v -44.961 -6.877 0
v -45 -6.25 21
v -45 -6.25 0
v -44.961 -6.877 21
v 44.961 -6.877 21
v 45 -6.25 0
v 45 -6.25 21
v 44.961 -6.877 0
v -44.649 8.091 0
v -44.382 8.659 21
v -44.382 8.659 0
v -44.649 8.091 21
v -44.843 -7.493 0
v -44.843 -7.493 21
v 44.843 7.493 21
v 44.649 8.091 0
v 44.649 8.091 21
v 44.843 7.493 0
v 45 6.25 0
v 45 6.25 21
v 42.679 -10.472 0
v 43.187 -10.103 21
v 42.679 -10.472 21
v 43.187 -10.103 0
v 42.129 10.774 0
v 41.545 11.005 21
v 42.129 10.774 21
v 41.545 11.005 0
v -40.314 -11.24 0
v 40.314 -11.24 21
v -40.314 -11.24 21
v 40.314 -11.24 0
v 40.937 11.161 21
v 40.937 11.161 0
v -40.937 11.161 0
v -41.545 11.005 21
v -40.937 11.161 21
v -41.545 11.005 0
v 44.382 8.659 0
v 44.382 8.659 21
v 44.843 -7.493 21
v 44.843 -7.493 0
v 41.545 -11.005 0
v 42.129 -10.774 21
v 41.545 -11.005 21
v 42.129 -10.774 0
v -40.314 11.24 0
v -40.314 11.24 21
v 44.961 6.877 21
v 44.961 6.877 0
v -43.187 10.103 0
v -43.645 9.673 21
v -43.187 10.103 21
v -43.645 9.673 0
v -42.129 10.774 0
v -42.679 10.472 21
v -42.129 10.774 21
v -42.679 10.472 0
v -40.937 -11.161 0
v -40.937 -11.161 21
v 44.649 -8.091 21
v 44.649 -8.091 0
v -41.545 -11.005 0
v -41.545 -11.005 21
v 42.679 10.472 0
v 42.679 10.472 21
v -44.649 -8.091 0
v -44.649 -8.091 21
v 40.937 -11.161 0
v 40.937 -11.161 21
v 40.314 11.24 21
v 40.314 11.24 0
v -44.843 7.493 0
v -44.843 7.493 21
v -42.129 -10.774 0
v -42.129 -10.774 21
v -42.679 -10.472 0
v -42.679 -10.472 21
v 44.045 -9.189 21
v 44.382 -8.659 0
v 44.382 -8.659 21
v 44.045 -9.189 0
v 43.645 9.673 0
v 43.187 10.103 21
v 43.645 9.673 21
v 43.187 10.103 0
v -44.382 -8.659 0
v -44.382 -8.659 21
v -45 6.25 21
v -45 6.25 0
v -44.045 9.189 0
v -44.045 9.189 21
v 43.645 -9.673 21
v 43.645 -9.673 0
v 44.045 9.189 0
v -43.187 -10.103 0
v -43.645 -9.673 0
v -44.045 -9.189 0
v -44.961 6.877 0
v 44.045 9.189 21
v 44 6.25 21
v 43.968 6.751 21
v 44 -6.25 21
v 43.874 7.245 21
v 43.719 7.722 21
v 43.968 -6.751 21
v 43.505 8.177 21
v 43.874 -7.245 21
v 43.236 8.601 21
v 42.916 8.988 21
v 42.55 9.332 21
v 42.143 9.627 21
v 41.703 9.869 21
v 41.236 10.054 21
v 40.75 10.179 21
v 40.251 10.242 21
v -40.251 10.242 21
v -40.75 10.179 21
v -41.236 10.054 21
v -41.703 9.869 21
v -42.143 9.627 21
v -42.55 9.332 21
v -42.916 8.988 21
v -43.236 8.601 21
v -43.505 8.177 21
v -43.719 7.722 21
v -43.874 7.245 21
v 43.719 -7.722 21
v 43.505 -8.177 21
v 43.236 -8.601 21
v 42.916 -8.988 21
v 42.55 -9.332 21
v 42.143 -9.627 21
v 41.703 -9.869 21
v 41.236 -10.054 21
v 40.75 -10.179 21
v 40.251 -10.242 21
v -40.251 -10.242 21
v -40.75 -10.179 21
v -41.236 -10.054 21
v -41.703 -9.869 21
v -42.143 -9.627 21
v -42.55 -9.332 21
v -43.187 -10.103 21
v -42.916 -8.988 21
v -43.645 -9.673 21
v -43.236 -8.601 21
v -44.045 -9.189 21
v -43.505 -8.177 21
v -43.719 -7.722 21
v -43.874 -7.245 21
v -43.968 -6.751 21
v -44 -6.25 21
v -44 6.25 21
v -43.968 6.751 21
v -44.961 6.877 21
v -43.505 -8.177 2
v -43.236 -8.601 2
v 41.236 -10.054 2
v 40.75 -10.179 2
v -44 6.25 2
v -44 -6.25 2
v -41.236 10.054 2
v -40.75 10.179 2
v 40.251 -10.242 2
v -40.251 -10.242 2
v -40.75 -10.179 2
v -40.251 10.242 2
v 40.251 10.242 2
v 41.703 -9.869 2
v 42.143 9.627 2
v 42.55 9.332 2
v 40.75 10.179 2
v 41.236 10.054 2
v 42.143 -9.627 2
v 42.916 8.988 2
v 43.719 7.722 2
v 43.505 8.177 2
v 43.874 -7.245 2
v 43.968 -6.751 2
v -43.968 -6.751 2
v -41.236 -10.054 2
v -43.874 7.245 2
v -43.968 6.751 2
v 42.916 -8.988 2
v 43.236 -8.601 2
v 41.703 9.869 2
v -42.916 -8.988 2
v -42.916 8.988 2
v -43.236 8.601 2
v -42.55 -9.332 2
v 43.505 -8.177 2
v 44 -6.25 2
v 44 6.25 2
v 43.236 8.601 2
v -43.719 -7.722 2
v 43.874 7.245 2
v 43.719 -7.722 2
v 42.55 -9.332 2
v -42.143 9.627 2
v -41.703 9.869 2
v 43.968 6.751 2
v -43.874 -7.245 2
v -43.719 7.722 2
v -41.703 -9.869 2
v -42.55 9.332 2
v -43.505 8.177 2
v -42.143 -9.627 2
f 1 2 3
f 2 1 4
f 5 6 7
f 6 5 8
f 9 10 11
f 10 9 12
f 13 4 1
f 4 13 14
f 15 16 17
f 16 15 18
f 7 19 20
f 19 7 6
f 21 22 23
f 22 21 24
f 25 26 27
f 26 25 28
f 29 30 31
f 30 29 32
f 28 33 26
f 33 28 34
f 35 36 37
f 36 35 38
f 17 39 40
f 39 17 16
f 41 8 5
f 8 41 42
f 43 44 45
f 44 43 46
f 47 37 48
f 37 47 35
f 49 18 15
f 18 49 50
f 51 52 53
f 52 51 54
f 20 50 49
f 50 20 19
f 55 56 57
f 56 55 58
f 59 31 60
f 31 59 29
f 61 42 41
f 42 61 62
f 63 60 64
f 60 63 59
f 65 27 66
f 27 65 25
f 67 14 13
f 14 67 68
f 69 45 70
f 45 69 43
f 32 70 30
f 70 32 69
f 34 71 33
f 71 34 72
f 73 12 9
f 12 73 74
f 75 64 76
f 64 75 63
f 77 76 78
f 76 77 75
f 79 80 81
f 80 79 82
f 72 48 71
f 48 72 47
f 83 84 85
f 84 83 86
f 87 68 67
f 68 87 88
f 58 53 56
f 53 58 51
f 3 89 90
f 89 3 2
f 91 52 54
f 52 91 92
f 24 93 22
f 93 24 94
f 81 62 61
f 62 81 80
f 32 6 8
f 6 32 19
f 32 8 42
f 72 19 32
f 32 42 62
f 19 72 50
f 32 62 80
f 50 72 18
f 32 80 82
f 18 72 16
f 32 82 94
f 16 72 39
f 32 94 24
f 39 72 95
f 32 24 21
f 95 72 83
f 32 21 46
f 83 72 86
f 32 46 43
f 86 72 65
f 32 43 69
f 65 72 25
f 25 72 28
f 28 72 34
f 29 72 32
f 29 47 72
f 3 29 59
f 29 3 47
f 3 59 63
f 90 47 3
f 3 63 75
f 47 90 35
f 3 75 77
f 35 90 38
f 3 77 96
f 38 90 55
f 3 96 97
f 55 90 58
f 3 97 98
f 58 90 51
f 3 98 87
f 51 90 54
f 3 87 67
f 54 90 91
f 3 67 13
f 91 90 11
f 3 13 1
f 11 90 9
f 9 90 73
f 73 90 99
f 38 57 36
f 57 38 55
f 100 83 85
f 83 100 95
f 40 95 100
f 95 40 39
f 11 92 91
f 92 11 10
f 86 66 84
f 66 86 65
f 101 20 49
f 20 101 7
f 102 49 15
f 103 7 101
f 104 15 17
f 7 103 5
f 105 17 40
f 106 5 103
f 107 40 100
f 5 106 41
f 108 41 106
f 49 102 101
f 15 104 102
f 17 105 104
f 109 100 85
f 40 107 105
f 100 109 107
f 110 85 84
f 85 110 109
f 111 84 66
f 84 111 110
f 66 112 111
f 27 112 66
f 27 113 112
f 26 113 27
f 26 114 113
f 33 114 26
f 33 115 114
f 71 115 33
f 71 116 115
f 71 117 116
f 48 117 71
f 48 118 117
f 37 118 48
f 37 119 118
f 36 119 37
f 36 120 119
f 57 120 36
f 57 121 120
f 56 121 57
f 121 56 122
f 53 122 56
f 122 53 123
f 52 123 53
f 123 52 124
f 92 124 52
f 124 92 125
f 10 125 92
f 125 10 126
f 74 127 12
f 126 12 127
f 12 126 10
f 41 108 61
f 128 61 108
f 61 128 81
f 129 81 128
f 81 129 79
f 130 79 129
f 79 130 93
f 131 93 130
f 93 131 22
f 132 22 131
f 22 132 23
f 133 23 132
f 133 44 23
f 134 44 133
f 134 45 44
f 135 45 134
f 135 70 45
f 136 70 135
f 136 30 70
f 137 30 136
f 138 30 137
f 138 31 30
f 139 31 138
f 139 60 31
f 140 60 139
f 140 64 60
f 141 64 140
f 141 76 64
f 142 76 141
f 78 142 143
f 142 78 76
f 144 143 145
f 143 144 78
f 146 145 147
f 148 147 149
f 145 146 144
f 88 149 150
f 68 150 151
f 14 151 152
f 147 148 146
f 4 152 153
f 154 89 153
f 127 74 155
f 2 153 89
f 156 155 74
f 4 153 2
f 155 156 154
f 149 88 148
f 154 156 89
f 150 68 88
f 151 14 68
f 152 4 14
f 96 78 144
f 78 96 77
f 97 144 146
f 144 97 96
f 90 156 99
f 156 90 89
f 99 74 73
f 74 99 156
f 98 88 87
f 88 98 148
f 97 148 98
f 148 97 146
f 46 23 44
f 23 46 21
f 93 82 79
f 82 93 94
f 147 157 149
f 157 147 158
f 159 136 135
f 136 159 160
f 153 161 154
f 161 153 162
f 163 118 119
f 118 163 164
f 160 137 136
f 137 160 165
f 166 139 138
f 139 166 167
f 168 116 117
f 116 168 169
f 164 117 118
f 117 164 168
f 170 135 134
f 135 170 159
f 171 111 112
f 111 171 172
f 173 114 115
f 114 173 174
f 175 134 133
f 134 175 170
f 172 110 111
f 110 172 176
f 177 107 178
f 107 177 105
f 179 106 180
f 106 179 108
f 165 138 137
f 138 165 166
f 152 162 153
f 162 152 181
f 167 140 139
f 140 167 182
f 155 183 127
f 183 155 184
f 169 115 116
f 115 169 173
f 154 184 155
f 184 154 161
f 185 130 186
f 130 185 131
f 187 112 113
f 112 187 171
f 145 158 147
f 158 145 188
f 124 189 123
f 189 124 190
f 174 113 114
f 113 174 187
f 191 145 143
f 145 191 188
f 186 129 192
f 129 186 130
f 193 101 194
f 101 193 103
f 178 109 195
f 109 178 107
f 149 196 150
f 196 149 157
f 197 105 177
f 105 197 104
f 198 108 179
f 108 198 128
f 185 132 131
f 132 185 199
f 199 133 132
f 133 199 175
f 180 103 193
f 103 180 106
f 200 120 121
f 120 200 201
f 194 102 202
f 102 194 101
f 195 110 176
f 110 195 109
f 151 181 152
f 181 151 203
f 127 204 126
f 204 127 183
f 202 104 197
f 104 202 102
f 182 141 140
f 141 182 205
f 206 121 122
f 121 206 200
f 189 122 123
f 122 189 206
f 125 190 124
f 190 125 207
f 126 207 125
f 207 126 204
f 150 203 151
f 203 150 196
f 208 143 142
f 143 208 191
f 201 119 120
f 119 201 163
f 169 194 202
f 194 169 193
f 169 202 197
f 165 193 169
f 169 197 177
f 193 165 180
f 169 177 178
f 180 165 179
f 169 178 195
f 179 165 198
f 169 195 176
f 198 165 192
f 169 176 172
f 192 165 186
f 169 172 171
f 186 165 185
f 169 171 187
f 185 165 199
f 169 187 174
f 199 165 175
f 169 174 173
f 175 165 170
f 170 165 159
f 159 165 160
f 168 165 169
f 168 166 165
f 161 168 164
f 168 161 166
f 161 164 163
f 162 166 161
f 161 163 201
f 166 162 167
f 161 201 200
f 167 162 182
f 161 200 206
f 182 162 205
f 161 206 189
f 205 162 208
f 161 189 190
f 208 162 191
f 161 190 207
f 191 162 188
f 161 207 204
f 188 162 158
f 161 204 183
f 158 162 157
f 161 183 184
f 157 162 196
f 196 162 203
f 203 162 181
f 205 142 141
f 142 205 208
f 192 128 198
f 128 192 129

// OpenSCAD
$fn = 50;


difference() {
	union() {
		hull() {
			translate(v = [-40.0000000000, 6.2500000000, 0]) {
				cylinder(h = 21, r = 5);
			}
			translate(v = [40.0000000000, 6.2500000000, 0]) {
				cylinder(h = 21, r = 5);
			}
			translate(v = [-40.0000000000, -6.2500000000, 0]) {
				cylinder(h = 21, r = 5);
			}
			translate(v = [40.0000000000, -6.2500000000, 0]) {
				cylinder(h = 21, r = 5);
			}
		}
	}
	union() {
		translate(v = [0, 0, 2]) {
			#hull() {
				translate(v = [-40.0000000000, 6.2500000000, 0]) {
					cylinder(h = 19, r = 4);
				}
				translate(v = [40.0000000000, 6.2500000000, 0]) {
					cylinder(h = 19, r = 4);
				}
				translate(v = [-40.0000000000, -6.2500000000, 0]) {
					cylinder(h = 19, r = 4);
				}
				translate(v = [40.0000000000, -6.2500000000, 0]) {
					cylinder(h = 19, r = 4);
				}
			}
		}
	}
}
